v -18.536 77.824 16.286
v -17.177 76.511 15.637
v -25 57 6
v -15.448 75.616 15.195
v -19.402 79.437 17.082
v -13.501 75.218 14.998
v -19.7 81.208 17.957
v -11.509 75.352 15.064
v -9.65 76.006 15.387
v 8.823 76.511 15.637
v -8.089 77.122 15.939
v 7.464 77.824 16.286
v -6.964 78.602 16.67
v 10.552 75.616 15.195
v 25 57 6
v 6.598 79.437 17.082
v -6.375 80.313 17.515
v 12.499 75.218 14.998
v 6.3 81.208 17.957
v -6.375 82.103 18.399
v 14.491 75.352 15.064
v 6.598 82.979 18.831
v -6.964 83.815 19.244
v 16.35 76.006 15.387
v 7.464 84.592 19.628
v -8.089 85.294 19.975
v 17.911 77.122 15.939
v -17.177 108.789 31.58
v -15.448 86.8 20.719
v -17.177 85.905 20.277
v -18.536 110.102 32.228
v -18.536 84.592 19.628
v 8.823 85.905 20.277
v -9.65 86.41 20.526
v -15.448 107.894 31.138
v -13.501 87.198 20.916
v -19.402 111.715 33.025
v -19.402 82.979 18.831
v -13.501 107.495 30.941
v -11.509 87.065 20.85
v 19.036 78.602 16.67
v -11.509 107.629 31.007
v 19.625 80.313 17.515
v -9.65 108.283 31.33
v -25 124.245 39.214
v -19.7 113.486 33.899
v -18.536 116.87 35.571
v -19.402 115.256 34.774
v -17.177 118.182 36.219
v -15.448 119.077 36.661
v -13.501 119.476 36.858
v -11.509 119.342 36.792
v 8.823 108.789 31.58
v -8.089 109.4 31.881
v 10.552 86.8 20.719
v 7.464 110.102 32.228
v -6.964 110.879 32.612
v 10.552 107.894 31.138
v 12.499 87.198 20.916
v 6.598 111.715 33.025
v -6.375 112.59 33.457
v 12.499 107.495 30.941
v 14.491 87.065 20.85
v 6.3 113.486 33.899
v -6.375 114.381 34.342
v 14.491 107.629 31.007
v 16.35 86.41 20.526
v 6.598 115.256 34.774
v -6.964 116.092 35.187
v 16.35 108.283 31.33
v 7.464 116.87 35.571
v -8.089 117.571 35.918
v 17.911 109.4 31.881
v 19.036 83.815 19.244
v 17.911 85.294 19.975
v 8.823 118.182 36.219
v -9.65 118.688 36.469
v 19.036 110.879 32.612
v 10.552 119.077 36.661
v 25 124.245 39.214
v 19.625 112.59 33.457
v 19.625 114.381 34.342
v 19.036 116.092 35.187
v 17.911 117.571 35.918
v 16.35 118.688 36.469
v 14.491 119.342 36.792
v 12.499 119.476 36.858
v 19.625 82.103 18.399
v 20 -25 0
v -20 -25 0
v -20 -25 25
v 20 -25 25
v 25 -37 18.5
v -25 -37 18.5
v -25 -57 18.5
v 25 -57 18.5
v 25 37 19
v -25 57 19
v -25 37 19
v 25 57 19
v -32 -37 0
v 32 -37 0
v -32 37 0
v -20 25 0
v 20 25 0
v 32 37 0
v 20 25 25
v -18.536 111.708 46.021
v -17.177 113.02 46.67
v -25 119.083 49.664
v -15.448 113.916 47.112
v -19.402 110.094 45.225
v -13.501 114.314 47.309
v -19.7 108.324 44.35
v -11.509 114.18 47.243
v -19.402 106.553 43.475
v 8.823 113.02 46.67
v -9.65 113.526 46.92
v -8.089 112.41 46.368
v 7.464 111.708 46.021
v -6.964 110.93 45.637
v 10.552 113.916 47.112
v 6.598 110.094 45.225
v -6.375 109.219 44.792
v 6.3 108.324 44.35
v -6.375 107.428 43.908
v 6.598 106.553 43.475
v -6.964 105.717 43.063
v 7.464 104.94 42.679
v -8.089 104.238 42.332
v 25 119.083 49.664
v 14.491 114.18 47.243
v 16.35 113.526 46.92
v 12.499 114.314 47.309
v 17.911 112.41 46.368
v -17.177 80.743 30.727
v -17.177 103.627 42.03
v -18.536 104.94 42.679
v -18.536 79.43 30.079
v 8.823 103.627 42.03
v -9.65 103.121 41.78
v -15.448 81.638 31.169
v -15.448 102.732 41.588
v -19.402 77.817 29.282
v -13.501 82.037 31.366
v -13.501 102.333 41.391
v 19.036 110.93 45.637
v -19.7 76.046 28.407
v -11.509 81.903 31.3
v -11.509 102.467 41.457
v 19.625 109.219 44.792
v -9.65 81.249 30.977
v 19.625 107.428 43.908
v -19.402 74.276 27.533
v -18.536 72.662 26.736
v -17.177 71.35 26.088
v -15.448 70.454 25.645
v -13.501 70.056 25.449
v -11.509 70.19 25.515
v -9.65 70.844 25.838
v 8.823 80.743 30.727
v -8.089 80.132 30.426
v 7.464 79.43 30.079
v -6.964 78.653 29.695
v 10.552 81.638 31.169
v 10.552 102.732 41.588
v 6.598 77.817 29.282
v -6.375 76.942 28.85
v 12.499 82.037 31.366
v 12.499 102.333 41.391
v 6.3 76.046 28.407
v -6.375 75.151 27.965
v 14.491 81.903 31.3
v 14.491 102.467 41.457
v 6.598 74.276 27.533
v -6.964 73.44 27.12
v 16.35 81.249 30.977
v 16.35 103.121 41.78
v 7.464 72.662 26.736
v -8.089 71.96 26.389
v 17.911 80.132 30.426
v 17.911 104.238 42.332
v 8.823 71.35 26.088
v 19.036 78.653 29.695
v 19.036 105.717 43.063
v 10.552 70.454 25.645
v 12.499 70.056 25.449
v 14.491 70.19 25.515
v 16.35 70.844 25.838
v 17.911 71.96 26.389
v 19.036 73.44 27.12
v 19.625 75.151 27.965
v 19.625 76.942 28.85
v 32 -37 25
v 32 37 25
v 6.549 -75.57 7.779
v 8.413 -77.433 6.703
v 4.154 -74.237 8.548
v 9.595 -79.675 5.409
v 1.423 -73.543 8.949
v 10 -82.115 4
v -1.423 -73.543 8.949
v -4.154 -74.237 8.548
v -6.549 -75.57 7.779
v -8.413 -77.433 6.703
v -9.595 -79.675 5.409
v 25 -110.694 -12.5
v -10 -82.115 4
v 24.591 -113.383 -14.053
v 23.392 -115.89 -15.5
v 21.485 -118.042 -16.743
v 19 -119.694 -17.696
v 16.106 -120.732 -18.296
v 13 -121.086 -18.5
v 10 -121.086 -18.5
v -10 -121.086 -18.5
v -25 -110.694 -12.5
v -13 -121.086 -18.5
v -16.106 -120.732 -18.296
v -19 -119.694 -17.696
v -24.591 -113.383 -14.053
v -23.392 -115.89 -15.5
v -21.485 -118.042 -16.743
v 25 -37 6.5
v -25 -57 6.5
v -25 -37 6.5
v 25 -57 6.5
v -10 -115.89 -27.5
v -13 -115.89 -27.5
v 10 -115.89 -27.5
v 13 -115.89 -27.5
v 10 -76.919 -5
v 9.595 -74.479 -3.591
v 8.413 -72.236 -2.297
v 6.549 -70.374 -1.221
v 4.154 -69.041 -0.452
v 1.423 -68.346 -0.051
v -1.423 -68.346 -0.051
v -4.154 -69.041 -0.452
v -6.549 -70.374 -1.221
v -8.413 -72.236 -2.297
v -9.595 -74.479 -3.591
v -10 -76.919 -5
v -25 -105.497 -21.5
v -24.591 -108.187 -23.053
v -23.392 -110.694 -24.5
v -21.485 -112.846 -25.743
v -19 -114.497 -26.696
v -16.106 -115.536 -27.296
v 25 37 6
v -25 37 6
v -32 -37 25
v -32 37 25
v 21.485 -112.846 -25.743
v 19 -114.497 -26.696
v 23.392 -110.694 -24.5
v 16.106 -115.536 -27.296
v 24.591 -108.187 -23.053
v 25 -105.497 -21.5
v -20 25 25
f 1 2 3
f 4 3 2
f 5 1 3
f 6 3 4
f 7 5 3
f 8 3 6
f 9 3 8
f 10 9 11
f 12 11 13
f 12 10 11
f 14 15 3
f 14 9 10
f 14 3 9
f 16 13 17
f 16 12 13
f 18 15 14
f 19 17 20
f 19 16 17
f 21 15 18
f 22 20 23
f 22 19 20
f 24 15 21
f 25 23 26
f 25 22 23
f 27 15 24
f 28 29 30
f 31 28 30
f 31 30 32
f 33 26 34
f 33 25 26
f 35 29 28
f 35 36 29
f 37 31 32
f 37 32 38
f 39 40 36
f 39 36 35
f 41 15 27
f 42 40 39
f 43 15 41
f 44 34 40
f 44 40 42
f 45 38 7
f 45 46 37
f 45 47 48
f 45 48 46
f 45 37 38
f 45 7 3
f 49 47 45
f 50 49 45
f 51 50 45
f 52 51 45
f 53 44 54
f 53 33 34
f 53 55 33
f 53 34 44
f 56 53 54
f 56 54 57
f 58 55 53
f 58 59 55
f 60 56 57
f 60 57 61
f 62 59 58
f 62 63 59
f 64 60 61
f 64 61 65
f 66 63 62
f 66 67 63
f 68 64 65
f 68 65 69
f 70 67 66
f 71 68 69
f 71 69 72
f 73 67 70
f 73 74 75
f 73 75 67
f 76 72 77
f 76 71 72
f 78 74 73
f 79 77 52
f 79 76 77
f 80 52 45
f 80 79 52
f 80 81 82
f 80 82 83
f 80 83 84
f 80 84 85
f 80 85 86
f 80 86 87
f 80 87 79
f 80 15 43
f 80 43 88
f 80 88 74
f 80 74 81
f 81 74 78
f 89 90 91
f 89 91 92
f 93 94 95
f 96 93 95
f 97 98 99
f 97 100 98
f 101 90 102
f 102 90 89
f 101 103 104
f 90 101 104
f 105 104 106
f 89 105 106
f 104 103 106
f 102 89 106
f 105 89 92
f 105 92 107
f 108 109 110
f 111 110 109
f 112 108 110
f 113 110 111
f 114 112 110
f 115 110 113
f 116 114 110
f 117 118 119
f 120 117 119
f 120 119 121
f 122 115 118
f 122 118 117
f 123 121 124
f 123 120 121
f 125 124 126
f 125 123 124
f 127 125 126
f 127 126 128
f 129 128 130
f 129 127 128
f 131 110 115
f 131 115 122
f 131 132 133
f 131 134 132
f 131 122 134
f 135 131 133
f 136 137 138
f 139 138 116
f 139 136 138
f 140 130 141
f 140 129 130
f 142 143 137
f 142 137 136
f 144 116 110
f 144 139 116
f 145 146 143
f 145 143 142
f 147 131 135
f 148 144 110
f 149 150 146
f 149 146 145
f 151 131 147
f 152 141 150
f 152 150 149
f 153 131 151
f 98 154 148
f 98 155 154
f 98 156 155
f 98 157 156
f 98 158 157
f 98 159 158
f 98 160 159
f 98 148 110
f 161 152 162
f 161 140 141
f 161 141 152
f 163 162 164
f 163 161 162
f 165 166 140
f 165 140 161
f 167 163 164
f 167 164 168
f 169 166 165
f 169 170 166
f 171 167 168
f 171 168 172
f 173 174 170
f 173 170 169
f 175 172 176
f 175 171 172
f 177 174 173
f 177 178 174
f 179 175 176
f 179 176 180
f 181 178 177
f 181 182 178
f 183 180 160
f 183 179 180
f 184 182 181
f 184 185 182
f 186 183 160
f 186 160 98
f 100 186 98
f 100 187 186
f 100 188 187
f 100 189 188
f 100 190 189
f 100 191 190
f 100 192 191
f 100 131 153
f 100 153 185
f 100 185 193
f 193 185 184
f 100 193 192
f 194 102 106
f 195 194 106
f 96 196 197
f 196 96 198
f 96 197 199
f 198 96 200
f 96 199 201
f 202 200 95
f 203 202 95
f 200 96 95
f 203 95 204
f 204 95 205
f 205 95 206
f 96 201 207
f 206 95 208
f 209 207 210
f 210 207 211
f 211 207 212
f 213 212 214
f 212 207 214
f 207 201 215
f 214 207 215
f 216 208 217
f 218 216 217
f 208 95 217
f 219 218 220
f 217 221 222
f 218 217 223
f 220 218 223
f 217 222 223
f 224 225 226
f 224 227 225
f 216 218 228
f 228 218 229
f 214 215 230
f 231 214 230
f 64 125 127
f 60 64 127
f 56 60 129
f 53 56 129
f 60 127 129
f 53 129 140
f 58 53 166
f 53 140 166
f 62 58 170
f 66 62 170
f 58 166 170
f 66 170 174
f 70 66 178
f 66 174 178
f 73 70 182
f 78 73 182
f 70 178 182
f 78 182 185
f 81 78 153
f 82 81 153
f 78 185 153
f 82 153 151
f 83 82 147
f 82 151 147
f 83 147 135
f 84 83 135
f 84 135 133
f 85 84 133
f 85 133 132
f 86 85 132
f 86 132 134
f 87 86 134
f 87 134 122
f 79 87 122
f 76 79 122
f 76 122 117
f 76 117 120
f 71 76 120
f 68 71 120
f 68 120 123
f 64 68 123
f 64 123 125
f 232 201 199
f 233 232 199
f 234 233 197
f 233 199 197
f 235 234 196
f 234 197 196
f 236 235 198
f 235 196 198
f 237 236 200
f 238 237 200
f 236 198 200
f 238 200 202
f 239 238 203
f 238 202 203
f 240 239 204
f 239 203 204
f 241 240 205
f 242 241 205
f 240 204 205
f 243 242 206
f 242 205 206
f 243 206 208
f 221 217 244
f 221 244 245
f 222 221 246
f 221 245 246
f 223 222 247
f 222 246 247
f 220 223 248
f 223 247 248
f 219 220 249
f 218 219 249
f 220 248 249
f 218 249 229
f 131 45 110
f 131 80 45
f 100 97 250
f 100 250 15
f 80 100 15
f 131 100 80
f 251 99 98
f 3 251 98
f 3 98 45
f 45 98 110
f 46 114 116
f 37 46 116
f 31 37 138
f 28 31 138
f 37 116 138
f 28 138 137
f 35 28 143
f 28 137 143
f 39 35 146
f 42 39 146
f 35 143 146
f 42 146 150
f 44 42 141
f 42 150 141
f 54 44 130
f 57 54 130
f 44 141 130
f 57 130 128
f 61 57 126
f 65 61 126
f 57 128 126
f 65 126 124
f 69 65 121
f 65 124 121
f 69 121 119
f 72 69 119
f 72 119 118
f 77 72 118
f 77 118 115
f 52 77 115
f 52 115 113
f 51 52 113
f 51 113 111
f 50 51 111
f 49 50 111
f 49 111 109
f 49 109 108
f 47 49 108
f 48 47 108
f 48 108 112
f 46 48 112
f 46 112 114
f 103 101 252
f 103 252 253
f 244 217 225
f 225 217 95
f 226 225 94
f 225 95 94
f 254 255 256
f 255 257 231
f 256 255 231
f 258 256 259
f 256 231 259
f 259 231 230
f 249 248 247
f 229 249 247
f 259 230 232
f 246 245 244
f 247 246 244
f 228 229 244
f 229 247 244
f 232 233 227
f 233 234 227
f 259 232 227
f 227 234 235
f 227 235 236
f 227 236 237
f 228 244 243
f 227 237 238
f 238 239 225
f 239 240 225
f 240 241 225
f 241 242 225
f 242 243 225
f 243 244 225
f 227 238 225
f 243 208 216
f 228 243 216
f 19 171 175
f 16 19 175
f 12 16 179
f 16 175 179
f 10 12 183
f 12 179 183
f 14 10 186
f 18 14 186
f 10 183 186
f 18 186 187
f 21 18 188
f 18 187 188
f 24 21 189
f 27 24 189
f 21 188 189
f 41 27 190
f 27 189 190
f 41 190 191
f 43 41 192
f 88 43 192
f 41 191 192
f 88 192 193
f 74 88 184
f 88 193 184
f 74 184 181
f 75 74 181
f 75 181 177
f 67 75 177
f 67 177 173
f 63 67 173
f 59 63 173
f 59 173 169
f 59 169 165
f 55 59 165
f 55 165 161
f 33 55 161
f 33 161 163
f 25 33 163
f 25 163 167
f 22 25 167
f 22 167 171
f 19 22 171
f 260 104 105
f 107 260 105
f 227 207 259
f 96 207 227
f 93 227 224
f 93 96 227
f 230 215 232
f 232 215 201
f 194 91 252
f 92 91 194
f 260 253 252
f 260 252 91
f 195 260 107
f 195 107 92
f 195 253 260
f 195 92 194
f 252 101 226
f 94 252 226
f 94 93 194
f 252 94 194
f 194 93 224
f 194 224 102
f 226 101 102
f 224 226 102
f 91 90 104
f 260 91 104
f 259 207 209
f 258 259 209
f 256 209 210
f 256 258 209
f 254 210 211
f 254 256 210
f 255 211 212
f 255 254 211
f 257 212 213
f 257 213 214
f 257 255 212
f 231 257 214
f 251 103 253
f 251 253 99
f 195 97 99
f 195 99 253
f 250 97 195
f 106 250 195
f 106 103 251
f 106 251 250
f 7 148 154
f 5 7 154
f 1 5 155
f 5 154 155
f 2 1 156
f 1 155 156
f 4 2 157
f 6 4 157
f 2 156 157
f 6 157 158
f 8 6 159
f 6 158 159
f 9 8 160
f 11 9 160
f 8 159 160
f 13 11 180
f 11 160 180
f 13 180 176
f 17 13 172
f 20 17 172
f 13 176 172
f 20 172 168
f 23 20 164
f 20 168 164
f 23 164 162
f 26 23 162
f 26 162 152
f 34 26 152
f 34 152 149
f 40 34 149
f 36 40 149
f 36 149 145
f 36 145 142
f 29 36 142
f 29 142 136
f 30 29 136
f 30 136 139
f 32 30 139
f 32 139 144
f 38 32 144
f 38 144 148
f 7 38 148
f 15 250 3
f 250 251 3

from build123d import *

# Parameters (mm, degrees)
F0_W          = 64
F0_H          = 74
F0_W_2        = 40
F0_H_2        = 50
F1_DEPTH      = 25
F3_DEPTH      = 25
F3_DEPTH_BACK = 25
F5_DEPTH      = 25
F6_R          = 12
F7_R          = 12
F9_DEPTH      = 25
F9_DEPTH_BACK = 25
F11_DEPTH     = 25


with BuildPart() as f1:
    # F0 (on Top) → F1 (new body)
    with BuildSketch(Plane.XY):
        Rectangle(F0_W, F0_H)
        Rectangle(F0_W_2, F0_H_2, mode=Mode.SUBTRACT)
    extrude(amount=F1_DEPTH)

    # F2 (on Right) → F3 (join, two sides)
    with BuildSketch(Plane.YZ) as f3_sk:
        Polygon((-37, 12.5), (-37, 18.5), (-57, 18.5), (-57, 6.5), (-37, 6.5), align=None)
        Polygon((-57, 6.5), (-57, 18.5), (-121.08587988, -18.5), (-115.8897274573, -27.5), align=None)
    extrude(amount=-F3_DEPTH)
    extrude(f3_sk.sketch, amount=F3_DEPTH_BACK)

    # F4 (on face) → F5 (cut)
    with BuildSketch(Plane(origin=(0, -22.260734985, 38.5567240079), x_dir=(1, 0, 0), z_dir=(0, -0.5, 0.8660254038))):
        with BuildLine():
            Line((0, -79.1134480157), (0, -114.1134480157))
            Line((0, -114.1134480157), (10, -114.1134480157))
            Line((10, -114.1134480157), (10, -69.1134480157))
            ThreePointArc((10, -69.1134480157), (7.0710678119, -76.1845158276), (0, -79.1134480157))
        make_face()
        with BuildLine():
            ThreePointArc((10, -69.1134480157), (0, -59.1134480157), (-10, -69.1134480157))
            ThreePointArc((-10, -69.1134480157), (-7.0710678119, -76.1845158276), (0, -79.1134480157))
            ThreePointArc((0, -79.1134480157), (7.0710678119, -76.1845158276), (10, -69.1134480157))
        make_face()
        with BuildLine():
            Line((-10, -69.1134480157), (-10, -114.1134480157))
            Line((-10, -114.1134480157), (0, -114.1134480157))
            Line((0, -114.1134480157), (0, -79.1134480157))
            ThreePointArc((0, -79.1134480157), (-7.0710678119, -76.1845158276), (-10, -69.1134480157))
        make_face()
    extrude(amount=-F5_DEPTH, mode=Mode.SUBTRACT)

    # F6
    f6_edges = [f1.edges().sort_by_distance(p)[0] for p in [
        (-25, -118.487804, -23),
    ]]
    fillet(f6_edges, radius=F6_R)

    # F7
    f7_edges = [f1.edges().sort_by_distance(p)[0] for p in [
        (25, -118.487804, -23),
    ]]
    fillet(f7_edges, radius=F7_R)

    # F8 (on Right) → F9 (join, two sides)
    with BuildSketch(Plane.YZ) as f9_sk:
        Polygon((57, 19), (37, 19), (37, 6), (57, 6), (124.2447130228, 39.2136804718), (119.0829748267, 49.6641815534), align=None)
    extrude(amount=F9_DEPTH)
    extrude(f9_sk.sketch, amount=-F9_DEPTH_BACK)

    # F10 (on face) → F11 (cut)
    with BuildSketch(Plane(origin=(0, 3.634493279, -7.3584274328), x_dir=(1, 0, 0), z_dir=(0, -0.442849073, 0.8965961736))):
        with BuildLine():
            ThreePointArc((19.7, 116.7630763351), (13, 123.4630763351), (6.3, 116.7630763351))
            Line((6.3, 116.7630763351), (19.7, 116.7630763351))
        make_face()
        with BuildLine():
            Line((19.7, 116.7630763351), (6.3, 116.7630763351))
            ThreePointArc((6.3, 116.7630763351), (13, 110.0630763351), (19.7, 116.7630763351))
        make_face()
        with BuildLine():
            ThreePointArc((-6.3, 116.7630763351), (-13, 123.4630763351), (-19.7, 116.7630763351))
            Line((-19.7, 116.7630763351), (-6.3, 116.7630763351))
        make_face()
        with BuildLine():
            Line((-6.3, 116.7630763351), (-19.7, 116.7630763351))
            ThreePointArc((-19.7, 116.7630763351), (-13, 110.0630763351), (-6.3, 116.7630763351))
        make_face()
        with BuildLine():
            ThreePointArc((19.7, 80.7630763351), (13, 87.4630763351), (6.3, 80.7630763351))
            Line((6.3, 80.7630763351), (19.7, 80.7630763351))
        make_face()
        with BuildLine():
            Line((19.7, 80.7630763351), (6.3, 80.7630763351))
            ThreePointArc((6.3, 80.7630763351), (13, 74.0630763351), (19.7, 80.7630763351))
        make_face()
        with BuildLine():
            ThreePointArc((-6.3, 80.7630763351), (-13, 87.4630763351), (-19.7, 80.7630763351))
            Line((-19.7, 80.7630763351), (-6.3, 80.7630763351))
        make_face()
        with BuildLine():
            Line((-6.3, 80.7630763351), (-19.7, 80.7630763351))
            ThreePointArc((-19.7, 80.7630763351), (-13, 74.0630763351), (-6.3, 80.7630763351))
        make_face()
    extrude(amount=-F11_DEPTH, mode=Mode.SUBTRACT)


solid = f1.part
